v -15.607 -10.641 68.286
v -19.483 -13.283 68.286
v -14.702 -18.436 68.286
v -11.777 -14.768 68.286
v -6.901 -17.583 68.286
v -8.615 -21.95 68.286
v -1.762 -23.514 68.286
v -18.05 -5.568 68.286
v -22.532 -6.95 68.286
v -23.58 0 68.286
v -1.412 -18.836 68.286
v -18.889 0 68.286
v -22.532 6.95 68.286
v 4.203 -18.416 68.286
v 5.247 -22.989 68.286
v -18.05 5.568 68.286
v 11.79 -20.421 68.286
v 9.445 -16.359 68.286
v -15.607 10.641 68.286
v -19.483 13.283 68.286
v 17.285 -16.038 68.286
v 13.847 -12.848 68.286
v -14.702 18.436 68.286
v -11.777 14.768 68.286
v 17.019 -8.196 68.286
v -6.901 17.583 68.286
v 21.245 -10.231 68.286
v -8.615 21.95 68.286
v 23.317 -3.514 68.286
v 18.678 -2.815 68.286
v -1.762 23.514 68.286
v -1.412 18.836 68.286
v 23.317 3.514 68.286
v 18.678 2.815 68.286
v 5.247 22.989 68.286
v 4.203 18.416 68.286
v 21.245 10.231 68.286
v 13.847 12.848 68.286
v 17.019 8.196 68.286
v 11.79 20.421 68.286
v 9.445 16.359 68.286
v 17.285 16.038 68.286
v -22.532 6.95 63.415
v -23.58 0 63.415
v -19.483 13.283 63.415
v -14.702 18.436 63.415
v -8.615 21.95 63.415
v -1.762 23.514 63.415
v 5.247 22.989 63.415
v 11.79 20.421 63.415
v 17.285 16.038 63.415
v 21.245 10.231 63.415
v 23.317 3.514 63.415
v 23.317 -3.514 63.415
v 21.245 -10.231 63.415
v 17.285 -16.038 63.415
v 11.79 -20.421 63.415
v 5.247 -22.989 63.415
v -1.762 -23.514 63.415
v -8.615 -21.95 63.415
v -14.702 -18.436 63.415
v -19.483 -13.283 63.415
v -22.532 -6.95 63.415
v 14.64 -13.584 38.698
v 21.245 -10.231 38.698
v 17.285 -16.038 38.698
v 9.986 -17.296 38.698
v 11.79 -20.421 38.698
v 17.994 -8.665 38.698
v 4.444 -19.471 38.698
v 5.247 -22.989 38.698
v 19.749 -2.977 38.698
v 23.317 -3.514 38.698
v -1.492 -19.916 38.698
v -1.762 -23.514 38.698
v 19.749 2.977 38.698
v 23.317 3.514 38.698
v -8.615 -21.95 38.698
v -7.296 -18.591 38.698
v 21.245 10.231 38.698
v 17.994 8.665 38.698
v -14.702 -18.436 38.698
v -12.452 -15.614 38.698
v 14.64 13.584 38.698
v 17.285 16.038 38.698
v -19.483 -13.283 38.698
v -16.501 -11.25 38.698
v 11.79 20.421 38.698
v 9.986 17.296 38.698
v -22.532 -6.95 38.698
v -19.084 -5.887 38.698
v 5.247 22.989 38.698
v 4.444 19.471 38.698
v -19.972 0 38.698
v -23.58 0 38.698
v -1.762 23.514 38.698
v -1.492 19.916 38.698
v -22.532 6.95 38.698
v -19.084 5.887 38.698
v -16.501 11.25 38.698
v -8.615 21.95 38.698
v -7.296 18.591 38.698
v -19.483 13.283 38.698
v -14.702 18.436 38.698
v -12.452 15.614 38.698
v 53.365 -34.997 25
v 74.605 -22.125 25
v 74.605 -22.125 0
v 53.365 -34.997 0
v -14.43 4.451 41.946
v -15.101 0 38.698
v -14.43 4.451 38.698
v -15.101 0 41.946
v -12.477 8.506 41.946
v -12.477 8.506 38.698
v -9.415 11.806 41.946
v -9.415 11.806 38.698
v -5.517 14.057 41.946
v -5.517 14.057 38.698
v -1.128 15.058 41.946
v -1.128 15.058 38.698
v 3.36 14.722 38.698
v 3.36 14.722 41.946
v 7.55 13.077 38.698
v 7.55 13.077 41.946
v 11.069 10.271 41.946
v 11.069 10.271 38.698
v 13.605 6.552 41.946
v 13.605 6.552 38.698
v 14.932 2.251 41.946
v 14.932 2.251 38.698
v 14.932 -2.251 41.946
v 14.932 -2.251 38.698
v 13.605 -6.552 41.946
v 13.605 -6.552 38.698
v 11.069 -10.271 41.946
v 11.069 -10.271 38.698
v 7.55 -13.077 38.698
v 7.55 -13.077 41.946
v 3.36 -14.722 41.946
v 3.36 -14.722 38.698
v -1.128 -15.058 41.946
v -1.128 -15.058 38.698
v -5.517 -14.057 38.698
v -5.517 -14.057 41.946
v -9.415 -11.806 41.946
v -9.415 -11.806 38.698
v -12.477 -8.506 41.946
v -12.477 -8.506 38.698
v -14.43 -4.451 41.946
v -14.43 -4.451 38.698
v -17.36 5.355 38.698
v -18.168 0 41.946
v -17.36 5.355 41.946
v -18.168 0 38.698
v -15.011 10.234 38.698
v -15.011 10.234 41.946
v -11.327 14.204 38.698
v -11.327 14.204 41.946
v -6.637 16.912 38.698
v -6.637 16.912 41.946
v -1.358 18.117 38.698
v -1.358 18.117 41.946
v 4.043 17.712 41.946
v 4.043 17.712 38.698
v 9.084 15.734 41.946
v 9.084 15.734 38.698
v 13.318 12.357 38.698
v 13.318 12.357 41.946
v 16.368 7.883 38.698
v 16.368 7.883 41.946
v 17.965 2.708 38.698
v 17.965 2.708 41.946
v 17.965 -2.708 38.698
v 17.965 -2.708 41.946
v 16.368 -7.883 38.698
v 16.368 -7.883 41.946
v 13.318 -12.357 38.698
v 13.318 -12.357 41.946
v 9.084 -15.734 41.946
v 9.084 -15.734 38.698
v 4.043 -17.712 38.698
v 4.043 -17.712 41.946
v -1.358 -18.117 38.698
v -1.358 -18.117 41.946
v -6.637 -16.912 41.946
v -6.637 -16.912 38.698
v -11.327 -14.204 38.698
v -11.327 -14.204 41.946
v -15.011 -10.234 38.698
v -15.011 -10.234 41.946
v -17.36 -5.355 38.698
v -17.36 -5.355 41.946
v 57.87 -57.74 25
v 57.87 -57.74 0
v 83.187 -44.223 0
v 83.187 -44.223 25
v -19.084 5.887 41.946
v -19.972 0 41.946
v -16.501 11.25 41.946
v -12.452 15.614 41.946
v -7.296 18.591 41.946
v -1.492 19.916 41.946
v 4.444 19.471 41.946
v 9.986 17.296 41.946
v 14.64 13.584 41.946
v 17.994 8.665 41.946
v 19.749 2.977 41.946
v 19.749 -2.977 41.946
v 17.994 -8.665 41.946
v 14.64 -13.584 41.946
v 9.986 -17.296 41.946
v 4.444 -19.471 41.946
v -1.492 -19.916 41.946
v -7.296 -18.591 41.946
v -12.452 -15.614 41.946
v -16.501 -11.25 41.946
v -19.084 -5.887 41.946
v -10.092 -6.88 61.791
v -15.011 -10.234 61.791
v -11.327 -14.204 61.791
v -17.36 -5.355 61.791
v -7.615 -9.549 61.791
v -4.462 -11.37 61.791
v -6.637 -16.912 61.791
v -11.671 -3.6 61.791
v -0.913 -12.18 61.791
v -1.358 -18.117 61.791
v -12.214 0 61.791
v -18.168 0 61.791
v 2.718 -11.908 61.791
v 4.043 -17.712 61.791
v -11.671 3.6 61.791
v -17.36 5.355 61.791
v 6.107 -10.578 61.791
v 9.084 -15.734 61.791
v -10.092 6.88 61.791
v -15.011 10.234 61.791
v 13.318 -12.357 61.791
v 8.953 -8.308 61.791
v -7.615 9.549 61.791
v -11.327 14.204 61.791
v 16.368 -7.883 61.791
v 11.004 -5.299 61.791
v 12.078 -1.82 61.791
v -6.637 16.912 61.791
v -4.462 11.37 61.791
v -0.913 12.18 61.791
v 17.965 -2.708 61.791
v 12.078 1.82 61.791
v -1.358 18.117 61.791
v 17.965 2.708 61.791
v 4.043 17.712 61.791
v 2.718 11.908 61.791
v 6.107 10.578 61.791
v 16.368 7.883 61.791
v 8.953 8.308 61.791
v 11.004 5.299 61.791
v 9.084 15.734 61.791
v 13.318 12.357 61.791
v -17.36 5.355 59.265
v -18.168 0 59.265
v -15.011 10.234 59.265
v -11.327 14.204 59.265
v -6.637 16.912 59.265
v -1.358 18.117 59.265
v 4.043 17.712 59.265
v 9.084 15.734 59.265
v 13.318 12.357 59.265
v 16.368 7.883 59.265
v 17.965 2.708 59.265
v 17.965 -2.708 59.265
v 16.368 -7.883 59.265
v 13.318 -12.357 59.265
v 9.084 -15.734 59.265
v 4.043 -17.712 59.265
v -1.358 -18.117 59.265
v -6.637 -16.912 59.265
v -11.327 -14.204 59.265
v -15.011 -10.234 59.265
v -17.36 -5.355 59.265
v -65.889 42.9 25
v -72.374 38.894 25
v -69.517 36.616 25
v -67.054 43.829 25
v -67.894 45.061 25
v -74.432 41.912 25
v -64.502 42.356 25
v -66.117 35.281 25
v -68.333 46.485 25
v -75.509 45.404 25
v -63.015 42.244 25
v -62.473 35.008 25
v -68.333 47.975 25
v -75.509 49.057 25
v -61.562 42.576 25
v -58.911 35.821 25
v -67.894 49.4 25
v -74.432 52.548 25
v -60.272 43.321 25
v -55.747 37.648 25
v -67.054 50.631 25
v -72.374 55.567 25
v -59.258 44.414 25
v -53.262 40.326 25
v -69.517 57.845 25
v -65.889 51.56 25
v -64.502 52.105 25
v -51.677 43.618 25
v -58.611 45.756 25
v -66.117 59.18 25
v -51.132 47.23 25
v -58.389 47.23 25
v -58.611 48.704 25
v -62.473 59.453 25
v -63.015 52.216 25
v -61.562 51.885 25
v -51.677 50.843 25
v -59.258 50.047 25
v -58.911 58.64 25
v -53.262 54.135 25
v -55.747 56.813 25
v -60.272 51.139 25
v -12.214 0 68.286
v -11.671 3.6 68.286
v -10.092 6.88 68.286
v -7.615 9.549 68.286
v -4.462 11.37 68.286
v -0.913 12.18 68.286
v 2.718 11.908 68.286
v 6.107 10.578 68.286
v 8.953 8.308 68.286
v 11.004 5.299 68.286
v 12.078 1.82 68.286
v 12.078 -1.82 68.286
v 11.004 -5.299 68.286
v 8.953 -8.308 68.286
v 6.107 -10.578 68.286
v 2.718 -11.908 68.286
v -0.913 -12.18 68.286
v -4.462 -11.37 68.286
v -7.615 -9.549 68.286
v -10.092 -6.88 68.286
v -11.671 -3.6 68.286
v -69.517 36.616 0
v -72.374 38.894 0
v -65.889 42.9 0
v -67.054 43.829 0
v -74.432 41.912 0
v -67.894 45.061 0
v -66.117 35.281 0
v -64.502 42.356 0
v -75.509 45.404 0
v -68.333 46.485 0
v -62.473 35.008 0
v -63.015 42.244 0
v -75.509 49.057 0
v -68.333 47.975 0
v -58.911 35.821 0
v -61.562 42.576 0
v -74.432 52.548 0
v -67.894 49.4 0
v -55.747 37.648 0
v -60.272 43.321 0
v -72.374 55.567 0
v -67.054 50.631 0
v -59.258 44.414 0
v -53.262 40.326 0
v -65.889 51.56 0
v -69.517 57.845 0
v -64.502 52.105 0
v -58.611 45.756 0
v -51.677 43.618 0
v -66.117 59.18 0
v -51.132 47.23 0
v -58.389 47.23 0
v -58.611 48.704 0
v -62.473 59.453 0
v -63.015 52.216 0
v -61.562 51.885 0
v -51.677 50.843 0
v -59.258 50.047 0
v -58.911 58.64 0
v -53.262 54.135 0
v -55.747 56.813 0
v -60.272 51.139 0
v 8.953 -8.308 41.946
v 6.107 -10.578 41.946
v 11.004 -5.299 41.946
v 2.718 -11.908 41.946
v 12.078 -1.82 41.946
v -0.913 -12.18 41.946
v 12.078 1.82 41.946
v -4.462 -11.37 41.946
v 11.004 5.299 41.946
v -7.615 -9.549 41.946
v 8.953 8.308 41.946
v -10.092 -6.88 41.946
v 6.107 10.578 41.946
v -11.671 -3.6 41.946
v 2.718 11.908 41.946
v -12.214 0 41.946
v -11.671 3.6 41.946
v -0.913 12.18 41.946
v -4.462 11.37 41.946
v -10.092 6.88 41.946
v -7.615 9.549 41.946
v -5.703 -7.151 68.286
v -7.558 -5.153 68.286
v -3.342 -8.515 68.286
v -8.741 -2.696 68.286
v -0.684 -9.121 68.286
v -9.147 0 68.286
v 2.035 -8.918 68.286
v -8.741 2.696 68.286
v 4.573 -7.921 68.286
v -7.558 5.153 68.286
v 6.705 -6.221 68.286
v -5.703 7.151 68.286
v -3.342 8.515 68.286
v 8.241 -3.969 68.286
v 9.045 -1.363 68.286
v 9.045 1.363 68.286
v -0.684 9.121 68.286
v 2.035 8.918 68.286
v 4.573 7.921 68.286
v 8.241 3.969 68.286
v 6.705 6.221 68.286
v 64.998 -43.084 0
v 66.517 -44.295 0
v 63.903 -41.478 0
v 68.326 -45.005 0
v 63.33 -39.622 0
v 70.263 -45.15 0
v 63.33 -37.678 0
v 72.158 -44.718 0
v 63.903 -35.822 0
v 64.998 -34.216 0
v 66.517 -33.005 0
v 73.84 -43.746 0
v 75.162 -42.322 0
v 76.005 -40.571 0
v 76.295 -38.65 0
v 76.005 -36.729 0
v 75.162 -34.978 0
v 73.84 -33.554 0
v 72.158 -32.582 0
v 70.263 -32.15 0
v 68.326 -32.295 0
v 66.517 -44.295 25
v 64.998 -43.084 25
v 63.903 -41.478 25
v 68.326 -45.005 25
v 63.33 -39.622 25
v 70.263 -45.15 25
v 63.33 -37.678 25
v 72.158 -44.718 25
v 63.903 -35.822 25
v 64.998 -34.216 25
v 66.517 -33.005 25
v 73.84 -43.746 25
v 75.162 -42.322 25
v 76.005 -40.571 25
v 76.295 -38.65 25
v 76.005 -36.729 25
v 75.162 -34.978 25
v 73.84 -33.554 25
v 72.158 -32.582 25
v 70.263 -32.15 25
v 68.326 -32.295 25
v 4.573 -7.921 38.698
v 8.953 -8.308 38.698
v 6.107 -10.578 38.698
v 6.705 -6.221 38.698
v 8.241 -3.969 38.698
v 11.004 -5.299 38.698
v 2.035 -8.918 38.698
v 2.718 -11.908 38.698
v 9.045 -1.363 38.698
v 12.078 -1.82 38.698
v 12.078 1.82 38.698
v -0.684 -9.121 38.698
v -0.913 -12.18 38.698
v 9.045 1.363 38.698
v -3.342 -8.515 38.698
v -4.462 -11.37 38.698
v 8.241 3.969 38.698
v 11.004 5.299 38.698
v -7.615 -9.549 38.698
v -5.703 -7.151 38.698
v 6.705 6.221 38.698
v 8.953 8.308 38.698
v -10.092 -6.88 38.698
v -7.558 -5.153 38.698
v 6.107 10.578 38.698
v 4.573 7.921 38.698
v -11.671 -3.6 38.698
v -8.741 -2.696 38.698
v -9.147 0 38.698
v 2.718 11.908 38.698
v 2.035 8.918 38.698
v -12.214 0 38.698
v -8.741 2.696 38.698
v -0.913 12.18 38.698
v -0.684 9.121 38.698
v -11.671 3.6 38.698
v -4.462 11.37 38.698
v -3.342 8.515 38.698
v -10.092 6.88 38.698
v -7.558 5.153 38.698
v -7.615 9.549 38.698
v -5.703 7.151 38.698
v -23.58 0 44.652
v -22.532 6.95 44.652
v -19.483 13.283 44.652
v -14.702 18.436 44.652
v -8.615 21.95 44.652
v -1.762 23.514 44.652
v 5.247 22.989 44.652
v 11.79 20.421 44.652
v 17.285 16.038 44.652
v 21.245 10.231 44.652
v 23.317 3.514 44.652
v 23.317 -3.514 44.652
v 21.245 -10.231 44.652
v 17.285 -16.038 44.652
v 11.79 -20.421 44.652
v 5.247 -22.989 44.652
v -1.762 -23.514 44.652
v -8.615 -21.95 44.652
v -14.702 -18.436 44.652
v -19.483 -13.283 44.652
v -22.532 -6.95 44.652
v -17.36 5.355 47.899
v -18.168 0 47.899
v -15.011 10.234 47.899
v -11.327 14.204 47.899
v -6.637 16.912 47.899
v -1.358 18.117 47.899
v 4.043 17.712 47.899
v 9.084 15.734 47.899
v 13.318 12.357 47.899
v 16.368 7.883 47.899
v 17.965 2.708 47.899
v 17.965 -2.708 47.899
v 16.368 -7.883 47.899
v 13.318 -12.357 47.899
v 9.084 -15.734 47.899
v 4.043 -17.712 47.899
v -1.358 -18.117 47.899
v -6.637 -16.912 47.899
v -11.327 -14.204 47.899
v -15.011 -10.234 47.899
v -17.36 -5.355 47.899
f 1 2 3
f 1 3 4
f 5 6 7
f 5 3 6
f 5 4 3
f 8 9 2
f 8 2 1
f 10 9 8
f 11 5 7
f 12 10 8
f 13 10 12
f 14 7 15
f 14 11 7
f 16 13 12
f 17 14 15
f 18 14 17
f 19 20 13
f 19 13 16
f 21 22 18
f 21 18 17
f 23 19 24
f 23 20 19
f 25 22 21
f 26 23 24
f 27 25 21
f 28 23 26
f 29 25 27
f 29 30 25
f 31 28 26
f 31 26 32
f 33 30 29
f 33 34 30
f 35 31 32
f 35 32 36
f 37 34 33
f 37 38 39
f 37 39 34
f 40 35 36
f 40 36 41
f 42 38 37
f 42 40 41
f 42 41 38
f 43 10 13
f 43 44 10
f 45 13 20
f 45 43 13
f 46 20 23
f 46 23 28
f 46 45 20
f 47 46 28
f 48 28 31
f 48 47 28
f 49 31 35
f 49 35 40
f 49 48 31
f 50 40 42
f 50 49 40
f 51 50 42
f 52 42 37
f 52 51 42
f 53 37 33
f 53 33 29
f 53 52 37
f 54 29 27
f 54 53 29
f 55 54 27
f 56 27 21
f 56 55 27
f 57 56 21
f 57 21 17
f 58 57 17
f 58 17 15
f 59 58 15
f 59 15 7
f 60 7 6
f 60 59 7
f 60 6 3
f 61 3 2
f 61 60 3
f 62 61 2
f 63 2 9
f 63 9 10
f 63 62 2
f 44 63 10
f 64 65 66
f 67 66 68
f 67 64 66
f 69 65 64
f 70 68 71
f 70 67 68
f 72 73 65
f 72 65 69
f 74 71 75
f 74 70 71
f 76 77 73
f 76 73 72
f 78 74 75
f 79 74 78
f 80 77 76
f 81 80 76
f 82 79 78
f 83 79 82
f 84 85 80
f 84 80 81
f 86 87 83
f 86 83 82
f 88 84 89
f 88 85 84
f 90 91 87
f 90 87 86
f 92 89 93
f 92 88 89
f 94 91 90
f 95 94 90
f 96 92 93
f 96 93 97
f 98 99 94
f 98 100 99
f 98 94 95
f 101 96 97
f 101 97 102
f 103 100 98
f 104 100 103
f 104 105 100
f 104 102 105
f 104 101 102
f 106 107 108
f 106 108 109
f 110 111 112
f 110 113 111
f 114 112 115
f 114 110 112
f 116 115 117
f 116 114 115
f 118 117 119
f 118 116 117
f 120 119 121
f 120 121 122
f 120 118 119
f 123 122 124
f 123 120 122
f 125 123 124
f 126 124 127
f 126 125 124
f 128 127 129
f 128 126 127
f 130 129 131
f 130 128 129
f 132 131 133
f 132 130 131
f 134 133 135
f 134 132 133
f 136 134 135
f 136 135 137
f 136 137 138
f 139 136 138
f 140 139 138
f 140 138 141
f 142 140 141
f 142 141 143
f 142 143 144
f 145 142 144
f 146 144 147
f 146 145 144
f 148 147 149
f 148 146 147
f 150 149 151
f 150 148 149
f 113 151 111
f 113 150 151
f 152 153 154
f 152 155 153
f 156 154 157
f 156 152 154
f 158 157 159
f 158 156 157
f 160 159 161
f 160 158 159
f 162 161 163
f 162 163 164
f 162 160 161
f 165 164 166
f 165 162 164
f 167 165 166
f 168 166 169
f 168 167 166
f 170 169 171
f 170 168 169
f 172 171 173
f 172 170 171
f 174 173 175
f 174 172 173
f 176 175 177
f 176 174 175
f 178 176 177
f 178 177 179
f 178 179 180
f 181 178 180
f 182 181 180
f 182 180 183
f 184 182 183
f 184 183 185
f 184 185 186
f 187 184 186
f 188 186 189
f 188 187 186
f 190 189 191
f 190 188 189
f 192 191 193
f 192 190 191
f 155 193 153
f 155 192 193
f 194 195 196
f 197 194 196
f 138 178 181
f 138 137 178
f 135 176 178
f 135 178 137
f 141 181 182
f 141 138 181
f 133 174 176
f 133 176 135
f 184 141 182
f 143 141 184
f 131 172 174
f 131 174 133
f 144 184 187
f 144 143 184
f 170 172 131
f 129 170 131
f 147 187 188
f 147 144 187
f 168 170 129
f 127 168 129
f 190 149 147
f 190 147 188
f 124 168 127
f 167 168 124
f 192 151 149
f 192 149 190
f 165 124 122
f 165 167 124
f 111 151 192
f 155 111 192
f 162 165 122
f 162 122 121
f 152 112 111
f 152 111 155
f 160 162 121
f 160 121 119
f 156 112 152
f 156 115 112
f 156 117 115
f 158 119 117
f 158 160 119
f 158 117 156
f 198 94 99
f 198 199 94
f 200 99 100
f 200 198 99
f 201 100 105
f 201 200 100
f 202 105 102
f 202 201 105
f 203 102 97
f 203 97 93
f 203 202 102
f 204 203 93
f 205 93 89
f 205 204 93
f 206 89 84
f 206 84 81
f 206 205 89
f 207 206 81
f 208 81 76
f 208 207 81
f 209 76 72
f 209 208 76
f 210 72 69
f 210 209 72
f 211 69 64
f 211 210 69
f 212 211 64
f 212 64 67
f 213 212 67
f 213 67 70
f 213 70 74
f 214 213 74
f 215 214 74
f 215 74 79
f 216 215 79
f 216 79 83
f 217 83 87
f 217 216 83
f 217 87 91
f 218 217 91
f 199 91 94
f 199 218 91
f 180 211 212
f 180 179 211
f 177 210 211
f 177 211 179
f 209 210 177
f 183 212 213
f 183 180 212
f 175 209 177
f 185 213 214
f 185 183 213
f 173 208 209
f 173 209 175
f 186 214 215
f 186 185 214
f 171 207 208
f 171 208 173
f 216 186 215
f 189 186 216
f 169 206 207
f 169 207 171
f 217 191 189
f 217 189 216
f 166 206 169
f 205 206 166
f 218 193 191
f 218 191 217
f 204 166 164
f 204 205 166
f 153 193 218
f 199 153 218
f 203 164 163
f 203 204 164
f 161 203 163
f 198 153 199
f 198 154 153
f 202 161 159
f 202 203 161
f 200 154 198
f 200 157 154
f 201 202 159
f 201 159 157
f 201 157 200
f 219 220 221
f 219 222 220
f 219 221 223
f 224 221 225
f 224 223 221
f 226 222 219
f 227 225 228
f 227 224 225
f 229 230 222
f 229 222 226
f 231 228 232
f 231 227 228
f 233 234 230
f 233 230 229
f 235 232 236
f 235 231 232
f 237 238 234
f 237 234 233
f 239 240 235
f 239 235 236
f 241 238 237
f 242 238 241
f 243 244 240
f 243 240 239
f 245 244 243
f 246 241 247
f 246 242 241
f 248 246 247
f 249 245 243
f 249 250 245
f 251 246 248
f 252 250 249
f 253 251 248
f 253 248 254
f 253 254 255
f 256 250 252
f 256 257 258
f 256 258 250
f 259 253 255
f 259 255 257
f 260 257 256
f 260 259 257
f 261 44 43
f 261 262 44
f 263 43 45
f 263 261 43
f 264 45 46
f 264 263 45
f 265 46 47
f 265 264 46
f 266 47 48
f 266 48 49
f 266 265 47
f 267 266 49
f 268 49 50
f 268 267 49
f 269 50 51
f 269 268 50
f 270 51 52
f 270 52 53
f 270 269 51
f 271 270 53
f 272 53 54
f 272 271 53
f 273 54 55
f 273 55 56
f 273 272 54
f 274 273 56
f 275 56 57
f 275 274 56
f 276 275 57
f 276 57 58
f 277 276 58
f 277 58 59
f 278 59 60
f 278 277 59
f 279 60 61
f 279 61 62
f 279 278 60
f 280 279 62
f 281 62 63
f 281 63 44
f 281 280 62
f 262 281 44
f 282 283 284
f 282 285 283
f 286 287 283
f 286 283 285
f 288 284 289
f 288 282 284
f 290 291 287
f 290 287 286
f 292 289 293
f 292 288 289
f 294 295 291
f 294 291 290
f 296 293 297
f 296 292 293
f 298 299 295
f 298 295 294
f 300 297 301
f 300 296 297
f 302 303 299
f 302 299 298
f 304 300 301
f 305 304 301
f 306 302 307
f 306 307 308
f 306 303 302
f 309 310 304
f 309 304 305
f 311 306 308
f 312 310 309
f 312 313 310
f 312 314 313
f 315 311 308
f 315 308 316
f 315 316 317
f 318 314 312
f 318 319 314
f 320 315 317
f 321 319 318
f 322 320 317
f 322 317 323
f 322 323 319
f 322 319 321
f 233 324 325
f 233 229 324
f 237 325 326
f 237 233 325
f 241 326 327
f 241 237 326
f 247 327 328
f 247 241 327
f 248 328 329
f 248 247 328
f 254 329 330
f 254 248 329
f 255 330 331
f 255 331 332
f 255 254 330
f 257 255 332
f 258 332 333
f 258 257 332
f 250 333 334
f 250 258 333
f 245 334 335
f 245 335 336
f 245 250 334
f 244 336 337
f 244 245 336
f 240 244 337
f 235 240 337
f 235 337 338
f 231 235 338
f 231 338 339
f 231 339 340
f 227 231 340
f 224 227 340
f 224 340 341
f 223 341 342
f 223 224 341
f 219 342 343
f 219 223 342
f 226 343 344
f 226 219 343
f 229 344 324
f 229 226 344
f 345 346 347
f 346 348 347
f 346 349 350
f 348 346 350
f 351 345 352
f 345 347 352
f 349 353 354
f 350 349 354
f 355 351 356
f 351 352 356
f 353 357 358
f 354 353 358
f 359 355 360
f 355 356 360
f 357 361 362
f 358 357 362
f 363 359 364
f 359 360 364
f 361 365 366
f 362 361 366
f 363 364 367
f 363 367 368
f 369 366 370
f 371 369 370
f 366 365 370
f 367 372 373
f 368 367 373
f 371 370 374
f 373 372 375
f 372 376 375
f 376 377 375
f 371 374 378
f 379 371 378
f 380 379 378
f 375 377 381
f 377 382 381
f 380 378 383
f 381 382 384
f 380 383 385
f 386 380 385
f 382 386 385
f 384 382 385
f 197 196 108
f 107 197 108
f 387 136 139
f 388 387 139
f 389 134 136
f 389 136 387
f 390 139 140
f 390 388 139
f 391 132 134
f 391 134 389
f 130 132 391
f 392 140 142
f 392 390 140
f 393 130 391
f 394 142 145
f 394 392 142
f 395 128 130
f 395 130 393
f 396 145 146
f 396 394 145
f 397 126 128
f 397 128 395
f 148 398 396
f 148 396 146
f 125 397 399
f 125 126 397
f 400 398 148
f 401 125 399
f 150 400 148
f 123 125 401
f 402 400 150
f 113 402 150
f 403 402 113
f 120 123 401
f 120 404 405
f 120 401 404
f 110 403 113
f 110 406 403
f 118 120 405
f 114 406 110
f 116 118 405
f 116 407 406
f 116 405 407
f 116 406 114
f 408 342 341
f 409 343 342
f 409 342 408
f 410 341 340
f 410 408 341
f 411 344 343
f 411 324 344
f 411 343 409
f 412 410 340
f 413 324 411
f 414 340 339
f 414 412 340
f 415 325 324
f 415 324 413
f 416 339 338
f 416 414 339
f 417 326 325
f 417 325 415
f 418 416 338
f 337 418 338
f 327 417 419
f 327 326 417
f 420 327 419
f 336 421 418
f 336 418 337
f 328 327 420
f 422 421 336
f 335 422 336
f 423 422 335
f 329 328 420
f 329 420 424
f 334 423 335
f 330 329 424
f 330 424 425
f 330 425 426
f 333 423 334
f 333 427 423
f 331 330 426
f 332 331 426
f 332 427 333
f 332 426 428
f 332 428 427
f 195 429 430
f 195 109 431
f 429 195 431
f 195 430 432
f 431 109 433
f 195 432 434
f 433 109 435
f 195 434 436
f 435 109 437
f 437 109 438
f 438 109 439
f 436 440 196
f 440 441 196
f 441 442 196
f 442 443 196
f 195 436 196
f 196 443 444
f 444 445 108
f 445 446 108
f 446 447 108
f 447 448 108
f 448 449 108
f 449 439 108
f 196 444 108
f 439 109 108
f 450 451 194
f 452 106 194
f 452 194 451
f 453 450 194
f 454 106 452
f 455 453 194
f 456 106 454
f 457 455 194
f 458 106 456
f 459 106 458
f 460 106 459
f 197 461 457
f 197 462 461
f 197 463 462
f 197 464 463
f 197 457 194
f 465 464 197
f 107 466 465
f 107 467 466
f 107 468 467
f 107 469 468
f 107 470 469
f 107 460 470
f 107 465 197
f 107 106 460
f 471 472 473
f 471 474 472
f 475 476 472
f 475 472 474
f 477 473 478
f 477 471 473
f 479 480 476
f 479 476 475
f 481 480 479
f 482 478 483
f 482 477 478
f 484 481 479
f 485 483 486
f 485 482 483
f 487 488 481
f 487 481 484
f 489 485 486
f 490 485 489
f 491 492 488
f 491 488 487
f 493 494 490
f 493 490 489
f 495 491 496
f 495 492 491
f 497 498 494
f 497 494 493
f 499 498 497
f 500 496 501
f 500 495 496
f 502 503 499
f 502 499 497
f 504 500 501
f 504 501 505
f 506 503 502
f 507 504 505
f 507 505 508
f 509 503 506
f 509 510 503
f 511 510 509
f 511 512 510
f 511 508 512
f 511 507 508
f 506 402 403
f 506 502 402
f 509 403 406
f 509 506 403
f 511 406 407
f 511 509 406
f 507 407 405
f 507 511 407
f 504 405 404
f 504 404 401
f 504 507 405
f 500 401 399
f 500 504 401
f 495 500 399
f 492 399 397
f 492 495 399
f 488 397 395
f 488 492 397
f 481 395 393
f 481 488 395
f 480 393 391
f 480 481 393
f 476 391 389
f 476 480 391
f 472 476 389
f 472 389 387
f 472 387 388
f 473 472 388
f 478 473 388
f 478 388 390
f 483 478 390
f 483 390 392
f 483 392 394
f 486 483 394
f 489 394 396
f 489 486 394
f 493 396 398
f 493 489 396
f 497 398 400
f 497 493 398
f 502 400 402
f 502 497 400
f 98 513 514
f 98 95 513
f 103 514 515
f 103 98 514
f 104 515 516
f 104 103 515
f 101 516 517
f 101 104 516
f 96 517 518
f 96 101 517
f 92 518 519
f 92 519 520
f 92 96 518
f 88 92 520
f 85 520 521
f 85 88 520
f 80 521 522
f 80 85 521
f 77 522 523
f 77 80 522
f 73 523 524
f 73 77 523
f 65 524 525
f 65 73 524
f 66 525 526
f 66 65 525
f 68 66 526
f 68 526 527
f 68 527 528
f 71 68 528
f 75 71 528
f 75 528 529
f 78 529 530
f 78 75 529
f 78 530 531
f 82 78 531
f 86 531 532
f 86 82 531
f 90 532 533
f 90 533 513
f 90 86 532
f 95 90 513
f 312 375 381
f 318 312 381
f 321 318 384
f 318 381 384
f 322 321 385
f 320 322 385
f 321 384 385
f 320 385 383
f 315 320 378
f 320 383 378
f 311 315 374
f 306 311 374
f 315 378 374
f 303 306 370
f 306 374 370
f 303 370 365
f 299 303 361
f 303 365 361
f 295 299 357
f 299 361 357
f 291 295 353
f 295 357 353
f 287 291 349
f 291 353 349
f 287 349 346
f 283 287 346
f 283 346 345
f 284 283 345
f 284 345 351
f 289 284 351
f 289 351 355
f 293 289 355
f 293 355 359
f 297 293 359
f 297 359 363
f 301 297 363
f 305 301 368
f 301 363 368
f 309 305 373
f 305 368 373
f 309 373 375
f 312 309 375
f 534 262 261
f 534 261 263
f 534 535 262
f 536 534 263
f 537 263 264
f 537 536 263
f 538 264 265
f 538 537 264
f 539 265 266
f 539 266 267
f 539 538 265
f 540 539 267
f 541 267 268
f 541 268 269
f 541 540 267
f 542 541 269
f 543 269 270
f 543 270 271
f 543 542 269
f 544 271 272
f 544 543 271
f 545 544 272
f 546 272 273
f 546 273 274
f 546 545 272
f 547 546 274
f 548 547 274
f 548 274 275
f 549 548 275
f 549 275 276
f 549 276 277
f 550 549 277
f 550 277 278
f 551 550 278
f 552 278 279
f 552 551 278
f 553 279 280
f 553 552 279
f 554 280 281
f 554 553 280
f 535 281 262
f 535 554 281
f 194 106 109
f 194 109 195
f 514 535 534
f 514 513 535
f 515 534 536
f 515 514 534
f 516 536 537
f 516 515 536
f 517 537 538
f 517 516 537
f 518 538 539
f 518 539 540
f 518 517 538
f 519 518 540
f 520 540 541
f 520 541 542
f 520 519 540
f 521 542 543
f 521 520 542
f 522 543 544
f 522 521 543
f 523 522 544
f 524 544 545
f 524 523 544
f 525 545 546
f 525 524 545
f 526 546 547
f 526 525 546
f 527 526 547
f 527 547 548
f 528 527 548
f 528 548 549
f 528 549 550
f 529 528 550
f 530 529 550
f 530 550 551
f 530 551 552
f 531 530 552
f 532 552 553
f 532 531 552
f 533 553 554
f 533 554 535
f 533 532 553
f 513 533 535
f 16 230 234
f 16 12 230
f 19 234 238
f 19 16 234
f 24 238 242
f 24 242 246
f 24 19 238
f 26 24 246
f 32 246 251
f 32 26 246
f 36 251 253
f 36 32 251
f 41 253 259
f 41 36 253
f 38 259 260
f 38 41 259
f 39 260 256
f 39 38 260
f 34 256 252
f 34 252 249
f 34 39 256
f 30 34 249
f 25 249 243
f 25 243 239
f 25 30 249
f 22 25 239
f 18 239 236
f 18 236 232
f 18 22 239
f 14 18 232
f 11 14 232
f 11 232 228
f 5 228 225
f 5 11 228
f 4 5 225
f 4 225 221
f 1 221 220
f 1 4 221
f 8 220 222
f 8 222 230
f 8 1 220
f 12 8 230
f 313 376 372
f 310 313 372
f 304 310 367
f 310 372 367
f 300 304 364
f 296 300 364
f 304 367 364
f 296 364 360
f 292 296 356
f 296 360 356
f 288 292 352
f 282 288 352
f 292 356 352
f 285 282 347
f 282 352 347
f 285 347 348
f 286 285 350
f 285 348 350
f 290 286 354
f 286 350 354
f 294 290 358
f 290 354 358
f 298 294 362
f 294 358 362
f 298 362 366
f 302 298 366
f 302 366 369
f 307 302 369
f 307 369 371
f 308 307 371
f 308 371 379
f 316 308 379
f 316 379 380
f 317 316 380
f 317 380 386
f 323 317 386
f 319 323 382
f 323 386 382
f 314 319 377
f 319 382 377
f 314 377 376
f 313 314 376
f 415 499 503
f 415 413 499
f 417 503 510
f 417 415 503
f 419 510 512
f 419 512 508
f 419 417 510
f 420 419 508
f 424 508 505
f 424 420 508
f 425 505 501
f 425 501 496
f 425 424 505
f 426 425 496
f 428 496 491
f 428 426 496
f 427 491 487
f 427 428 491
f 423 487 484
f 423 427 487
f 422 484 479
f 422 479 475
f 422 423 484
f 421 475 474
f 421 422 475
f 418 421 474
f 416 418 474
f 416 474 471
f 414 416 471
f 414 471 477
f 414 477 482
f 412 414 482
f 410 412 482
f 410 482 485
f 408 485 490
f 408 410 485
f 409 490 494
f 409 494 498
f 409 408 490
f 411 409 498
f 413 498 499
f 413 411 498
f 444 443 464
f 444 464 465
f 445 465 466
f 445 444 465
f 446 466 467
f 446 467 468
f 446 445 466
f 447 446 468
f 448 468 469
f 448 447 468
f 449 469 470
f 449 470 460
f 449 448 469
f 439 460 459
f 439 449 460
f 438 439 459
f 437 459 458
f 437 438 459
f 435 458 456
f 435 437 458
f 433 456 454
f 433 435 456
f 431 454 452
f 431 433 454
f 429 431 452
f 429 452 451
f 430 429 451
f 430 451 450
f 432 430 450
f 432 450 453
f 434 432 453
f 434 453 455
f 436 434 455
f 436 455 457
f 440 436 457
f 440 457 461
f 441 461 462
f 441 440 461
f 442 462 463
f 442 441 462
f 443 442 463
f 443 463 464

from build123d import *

# Parameters (mm, degrees)
F0_R     = 12.25667
F1_DEPTH = 25
F4_R     = 5
F5_DEPTH = 25
F6_R     = 6.518581
F7_DEPTH = 25


with BuildPart() as f1:
    # F0 (on Top) → F1 (new body)
    with BuildSketch(Plane.XY):
        with Locations((-63.389145, 47.230273)):
            Circle(F0_R)
    extrude(amount=F1_DEPTH)

    # F4 (on face) → F5 (cut, through all)
    with BuildSketch(Plane(origin=(0, 0, 0), x_dir=(1, 0, 0), z_dir=(0, 0, -1))):
        with Locations((-63.389145, -47.230273)):
            Circle(F4_R)
    extrude(amount=-F5_DEPTH, mode=Mode.SUBTRACT)


with BuildPart() as f3:
    # F2 (on Front) → F3 (revolve)
    with BuildSketch(Plane.XZ):
        Polygon((-18.167537, 61.791237), (-18.889185, 68.286084), (-23.579909, 68.286084), (-23.579909, 63.414954), (-18.167537, 59.265465), (-18.167537, 47.899485), (-23.579909, 44.652063), (-23.579909, 38.698457), (-19.971659, 38.698457), (-19.971659, 41.945878), (-18.167537, 41.945878), (-18.167537, 38.698457), (-15.100526, 38.698457), (-15.100526, 41.945878), (-12.213928, 41.945878), (-12.213928, 38.698457), (-9.146918, 38.698457), (-9.146918, 68.286084), (-12.213928, 68.286084), (-12.213928, 61.791237), align=None)
    revolve(axis=Axis((0, 0, 53.131446), (0, 0, -1)))


with BuildPart() as f7:
    # F6 (on Top) → F7 (new body)
    with BuildSketch(Plane.XY):
        Polygon((83.186708, -44.223033), (74.604809, -22.12462), (53.364586, -34.997482), (57.870086, -57.739537), align=None)
        with Locations((69.776148, -38.649976)):
            Circle(F6_R, mode=Mode.SUBTRACT)
    extrude(amount=F7_DEPTH)


solid = Compound([f1.part, f3.part, f7.part])
